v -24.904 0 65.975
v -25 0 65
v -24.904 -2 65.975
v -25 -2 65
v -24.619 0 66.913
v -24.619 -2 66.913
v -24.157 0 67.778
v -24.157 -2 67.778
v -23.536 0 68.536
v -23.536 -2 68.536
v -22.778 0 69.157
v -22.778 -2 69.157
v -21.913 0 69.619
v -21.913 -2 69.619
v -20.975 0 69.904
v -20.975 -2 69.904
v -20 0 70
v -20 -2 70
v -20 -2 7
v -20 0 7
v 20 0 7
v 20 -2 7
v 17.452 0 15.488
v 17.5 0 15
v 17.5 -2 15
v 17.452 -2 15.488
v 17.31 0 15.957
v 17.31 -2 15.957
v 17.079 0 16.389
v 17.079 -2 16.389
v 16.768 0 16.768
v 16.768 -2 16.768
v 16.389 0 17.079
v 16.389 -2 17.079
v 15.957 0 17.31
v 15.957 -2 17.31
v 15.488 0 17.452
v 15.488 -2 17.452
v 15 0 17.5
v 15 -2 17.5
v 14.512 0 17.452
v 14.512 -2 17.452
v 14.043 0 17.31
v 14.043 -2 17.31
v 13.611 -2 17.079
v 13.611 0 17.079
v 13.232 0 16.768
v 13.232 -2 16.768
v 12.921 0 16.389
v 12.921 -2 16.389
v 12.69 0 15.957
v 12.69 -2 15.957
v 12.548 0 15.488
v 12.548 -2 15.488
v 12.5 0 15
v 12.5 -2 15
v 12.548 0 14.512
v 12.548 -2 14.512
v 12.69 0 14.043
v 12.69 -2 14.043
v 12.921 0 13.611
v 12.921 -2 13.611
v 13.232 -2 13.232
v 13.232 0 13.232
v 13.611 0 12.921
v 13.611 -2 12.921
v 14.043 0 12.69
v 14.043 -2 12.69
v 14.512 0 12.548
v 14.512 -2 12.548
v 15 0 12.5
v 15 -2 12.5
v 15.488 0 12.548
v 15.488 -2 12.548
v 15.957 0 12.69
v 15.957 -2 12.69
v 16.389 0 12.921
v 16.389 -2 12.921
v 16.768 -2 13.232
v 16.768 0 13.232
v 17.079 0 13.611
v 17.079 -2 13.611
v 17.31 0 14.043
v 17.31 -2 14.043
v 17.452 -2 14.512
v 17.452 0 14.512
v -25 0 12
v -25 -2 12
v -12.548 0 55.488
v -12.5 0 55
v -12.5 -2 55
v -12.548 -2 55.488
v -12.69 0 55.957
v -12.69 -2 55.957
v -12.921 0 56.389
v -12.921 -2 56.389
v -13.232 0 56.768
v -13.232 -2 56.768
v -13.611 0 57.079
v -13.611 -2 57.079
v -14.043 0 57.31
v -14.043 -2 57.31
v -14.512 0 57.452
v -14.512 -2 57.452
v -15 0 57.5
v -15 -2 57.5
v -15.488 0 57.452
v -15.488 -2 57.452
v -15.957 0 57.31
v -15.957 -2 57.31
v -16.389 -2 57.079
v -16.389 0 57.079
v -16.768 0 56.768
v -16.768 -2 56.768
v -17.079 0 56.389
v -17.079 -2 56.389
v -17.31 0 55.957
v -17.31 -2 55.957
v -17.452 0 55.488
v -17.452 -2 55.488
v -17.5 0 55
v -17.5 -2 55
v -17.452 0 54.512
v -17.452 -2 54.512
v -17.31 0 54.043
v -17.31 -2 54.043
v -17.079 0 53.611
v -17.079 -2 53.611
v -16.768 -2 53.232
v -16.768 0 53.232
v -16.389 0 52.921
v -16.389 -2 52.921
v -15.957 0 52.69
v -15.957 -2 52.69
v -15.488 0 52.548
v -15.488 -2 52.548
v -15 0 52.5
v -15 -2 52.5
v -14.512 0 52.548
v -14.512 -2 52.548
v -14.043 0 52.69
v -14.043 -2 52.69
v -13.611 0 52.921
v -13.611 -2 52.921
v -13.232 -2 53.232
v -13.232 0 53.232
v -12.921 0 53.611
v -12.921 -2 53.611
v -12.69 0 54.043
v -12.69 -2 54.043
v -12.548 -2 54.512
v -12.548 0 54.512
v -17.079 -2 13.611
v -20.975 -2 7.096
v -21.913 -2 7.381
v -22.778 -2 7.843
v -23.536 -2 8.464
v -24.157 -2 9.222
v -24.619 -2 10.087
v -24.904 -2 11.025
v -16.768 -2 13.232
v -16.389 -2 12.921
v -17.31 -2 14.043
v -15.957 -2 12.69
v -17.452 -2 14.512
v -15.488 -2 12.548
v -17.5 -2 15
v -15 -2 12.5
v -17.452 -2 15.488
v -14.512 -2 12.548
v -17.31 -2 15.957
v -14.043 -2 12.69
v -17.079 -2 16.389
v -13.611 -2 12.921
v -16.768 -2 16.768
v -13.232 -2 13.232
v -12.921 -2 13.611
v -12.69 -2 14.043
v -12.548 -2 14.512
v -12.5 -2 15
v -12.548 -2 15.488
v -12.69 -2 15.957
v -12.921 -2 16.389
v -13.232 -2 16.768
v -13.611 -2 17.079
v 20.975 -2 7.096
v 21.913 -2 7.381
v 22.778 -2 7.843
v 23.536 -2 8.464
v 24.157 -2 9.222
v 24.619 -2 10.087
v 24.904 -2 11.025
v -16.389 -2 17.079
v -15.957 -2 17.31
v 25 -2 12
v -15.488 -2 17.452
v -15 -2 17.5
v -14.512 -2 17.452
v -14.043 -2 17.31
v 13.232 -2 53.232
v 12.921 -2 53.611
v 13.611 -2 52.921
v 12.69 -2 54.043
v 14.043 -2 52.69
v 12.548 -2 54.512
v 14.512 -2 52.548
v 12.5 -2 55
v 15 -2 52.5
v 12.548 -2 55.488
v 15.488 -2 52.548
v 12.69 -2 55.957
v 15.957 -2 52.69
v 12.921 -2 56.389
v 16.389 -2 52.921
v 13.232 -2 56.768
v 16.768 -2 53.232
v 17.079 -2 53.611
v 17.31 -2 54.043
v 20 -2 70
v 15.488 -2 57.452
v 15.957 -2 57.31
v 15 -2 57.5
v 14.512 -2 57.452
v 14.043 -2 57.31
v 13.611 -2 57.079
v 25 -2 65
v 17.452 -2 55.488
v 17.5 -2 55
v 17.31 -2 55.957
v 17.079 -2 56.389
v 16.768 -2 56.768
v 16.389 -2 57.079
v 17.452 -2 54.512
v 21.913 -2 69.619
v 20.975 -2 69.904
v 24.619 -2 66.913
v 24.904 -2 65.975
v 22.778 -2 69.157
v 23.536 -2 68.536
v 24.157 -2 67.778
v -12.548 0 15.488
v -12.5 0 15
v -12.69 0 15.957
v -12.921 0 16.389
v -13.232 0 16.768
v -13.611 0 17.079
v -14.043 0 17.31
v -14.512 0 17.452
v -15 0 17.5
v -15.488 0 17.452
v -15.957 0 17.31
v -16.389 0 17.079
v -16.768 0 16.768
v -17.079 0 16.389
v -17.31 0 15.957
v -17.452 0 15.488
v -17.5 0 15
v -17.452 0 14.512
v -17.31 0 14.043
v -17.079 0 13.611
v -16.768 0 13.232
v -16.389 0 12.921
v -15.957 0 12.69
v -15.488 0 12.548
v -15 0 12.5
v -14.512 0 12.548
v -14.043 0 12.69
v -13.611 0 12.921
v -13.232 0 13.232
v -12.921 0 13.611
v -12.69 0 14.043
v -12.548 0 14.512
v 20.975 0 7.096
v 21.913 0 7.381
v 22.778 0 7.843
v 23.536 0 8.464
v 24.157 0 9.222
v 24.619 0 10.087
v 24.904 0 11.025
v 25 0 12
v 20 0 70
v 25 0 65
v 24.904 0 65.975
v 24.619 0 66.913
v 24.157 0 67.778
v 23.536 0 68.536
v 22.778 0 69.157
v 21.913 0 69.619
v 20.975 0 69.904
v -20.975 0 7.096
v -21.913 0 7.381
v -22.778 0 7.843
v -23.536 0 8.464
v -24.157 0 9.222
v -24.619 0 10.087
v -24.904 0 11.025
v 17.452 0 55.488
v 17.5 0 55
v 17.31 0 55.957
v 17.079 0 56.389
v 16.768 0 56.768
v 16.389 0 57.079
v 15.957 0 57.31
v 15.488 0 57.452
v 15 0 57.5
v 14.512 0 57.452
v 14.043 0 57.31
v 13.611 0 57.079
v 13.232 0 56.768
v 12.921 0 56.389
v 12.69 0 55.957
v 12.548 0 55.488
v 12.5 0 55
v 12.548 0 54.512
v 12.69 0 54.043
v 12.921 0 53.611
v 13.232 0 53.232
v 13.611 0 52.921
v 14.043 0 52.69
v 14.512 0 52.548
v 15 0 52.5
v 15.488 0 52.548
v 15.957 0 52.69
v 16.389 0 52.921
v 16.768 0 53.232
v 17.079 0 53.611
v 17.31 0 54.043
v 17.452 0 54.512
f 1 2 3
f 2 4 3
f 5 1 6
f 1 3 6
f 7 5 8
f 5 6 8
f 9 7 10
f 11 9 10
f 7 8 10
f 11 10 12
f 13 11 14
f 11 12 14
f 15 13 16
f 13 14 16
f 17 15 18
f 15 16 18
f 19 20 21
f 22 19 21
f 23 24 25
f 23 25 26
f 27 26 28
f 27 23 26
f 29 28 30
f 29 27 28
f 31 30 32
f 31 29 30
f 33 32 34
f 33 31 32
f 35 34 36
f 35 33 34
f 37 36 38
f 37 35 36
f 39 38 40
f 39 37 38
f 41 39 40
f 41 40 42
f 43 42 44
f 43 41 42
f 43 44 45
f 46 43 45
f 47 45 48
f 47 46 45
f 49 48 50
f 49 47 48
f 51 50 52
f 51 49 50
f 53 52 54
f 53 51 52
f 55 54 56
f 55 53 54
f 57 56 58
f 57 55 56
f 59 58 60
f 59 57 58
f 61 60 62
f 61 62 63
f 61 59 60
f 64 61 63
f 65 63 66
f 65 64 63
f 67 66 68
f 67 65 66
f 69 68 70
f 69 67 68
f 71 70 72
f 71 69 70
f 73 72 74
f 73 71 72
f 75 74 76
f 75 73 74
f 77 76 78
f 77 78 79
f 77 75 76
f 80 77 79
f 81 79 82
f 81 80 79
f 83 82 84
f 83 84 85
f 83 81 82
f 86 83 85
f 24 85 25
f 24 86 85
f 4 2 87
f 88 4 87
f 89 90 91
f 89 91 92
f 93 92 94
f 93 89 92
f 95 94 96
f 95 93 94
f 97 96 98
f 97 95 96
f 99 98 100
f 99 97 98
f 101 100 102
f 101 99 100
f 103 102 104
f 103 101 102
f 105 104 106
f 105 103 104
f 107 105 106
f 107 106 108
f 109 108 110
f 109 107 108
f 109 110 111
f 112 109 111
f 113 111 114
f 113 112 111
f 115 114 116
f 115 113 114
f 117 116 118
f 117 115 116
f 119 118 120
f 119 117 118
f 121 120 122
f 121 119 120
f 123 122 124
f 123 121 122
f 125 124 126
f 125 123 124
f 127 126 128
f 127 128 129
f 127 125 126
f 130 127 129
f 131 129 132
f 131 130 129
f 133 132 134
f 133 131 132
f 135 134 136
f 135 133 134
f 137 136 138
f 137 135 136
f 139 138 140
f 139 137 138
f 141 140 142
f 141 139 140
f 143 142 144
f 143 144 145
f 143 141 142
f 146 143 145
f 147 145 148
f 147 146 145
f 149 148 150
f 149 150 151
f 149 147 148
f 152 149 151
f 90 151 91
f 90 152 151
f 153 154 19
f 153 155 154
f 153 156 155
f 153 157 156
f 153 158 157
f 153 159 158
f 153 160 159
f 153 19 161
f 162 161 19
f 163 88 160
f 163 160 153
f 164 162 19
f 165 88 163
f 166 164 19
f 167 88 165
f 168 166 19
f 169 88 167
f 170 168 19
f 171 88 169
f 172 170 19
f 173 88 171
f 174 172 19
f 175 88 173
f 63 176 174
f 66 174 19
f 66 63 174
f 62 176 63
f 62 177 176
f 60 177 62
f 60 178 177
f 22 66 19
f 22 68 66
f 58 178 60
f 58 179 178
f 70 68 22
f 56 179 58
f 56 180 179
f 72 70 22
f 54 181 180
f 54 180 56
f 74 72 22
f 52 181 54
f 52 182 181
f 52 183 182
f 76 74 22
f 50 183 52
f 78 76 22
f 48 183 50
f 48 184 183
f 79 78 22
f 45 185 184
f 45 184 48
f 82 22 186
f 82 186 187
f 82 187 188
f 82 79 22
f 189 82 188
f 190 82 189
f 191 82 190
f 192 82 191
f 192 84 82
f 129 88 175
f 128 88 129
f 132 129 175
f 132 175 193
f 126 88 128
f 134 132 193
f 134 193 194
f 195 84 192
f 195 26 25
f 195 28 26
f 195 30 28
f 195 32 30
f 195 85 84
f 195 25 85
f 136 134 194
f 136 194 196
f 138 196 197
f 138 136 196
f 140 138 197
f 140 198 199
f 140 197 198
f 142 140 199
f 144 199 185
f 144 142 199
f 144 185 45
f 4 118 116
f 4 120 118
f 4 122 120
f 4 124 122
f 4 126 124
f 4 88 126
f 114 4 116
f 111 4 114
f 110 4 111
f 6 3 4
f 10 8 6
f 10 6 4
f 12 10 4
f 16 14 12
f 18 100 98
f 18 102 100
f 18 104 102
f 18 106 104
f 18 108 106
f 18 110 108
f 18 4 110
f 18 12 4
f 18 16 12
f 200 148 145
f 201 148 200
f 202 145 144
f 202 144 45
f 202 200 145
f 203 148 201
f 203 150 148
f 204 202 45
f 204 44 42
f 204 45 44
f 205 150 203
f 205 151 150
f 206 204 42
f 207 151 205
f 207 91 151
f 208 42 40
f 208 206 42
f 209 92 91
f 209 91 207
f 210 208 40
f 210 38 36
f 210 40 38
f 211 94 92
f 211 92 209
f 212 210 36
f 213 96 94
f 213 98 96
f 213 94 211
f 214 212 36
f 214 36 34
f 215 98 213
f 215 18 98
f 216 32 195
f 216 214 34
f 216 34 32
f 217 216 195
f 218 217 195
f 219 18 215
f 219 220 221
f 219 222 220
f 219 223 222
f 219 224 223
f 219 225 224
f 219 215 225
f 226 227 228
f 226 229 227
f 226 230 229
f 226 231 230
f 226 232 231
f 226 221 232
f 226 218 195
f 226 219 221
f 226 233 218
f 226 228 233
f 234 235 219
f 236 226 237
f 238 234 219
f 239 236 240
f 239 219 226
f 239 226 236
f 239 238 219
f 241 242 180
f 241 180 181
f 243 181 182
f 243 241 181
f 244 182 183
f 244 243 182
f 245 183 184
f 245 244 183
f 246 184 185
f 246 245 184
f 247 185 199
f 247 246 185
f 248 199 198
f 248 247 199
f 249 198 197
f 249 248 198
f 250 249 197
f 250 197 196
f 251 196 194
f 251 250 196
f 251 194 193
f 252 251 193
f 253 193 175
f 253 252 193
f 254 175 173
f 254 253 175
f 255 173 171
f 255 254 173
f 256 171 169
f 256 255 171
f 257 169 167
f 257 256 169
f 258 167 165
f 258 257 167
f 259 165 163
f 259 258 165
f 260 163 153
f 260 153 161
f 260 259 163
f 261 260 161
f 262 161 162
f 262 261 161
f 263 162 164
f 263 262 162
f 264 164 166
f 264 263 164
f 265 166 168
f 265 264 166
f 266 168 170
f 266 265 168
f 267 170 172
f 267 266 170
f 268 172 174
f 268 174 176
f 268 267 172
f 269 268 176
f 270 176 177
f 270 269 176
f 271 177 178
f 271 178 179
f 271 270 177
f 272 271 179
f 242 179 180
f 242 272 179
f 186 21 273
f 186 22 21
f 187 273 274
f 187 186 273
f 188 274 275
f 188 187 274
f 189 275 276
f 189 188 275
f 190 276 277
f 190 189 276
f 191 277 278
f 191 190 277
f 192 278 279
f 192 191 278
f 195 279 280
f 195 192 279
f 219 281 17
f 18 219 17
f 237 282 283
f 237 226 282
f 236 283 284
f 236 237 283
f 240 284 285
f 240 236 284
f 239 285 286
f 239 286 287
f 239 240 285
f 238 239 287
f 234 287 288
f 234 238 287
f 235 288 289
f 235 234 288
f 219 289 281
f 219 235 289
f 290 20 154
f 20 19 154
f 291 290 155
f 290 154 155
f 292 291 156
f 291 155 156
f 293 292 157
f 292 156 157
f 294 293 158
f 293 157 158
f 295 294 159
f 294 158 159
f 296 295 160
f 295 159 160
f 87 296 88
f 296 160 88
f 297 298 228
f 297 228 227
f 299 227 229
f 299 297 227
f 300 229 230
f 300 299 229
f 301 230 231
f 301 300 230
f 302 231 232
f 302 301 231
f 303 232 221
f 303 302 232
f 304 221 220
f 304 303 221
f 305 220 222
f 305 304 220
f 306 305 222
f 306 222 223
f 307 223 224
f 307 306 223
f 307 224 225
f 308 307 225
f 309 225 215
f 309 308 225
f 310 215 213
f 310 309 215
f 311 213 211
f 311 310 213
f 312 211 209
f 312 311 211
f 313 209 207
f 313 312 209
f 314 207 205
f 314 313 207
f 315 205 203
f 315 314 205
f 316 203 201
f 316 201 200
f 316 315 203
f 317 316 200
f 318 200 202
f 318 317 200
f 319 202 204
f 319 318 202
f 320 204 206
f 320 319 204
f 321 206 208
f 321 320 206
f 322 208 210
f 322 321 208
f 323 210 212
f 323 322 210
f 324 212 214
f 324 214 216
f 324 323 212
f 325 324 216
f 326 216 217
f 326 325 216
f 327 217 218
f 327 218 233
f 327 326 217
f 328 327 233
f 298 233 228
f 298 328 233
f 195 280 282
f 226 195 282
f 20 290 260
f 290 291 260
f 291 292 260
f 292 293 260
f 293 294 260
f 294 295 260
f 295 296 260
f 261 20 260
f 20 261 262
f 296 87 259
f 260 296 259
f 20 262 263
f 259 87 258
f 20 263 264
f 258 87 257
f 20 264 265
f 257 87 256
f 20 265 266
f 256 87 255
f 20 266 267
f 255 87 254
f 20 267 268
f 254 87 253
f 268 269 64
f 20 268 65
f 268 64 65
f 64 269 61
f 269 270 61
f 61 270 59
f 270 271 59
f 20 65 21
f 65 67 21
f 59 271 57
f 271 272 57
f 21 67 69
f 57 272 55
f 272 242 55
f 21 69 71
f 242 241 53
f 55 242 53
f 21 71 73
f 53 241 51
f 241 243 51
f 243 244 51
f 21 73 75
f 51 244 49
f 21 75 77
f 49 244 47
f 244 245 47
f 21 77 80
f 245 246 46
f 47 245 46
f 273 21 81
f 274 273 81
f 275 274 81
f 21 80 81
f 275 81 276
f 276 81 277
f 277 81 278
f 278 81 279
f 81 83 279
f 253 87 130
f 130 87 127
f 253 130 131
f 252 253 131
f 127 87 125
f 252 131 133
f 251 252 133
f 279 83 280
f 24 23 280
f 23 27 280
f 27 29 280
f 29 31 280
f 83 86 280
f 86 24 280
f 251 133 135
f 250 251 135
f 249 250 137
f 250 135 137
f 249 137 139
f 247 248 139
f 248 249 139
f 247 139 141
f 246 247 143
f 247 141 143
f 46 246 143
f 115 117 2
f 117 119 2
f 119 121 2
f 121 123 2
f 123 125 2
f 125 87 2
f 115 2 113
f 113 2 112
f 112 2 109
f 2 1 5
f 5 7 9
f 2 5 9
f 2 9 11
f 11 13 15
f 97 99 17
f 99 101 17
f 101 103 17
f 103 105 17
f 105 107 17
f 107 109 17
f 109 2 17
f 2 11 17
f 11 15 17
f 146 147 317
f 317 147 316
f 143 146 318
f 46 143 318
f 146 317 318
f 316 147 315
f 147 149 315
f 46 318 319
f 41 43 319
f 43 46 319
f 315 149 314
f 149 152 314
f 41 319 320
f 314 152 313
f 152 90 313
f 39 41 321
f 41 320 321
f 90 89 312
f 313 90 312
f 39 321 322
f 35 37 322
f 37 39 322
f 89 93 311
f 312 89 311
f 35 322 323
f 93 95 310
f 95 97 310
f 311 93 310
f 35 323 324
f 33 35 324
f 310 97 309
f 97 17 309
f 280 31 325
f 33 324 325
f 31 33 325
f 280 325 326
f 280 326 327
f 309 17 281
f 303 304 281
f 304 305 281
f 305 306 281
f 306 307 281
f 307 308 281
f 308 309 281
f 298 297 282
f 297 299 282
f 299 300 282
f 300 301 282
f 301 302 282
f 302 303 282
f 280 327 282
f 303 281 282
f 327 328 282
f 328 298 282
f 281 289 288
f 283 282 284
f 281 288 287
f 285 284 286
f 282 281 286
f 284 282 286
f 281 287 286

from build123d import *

# Parameters (mm, degrees)
F0_R     = 2.5
F1_DEPTH = 2
F2_R     = 5


with BuildPart() as f1:
    # F0 (on Front) → F1 (new body)
    with BuildSketch(Plane.XZ):
        Polygon((-25, 7), (0, 7), (0, 50.54388), (0, 70), (-25, 70), align=None)
        with Locations((-15, 15)):
            Circle(F0_R, mode=Mode.SUBTRACT)
        with Locations((-15, 55)):
            Circle(F0_R, mode=Mode.SUBTRACT)
        Polygon((0, 50.54388), (0, 7), (25, 7), (25, 70), (0, 70), align=None)
        with Locations((15, 15)):
            Circle(F0_R, mode=Mode.SUBTRACT)
        with Locations((15, 55)):
            Circle(F0_R, mode=Mode.SUBTRACT)
    extrude(amount=F1_DEPTH)

    # F2
    f2_edges = [f1.edges().sort_by_distance(p)[0] for p in [
        (-25, -1, 70),
        (25, -1, 70),
        (-25, -1, 7),
        (25, -1, 7),
    ]]
    fillet(f2_edges, radius=F2_R)


solid = f1.part
